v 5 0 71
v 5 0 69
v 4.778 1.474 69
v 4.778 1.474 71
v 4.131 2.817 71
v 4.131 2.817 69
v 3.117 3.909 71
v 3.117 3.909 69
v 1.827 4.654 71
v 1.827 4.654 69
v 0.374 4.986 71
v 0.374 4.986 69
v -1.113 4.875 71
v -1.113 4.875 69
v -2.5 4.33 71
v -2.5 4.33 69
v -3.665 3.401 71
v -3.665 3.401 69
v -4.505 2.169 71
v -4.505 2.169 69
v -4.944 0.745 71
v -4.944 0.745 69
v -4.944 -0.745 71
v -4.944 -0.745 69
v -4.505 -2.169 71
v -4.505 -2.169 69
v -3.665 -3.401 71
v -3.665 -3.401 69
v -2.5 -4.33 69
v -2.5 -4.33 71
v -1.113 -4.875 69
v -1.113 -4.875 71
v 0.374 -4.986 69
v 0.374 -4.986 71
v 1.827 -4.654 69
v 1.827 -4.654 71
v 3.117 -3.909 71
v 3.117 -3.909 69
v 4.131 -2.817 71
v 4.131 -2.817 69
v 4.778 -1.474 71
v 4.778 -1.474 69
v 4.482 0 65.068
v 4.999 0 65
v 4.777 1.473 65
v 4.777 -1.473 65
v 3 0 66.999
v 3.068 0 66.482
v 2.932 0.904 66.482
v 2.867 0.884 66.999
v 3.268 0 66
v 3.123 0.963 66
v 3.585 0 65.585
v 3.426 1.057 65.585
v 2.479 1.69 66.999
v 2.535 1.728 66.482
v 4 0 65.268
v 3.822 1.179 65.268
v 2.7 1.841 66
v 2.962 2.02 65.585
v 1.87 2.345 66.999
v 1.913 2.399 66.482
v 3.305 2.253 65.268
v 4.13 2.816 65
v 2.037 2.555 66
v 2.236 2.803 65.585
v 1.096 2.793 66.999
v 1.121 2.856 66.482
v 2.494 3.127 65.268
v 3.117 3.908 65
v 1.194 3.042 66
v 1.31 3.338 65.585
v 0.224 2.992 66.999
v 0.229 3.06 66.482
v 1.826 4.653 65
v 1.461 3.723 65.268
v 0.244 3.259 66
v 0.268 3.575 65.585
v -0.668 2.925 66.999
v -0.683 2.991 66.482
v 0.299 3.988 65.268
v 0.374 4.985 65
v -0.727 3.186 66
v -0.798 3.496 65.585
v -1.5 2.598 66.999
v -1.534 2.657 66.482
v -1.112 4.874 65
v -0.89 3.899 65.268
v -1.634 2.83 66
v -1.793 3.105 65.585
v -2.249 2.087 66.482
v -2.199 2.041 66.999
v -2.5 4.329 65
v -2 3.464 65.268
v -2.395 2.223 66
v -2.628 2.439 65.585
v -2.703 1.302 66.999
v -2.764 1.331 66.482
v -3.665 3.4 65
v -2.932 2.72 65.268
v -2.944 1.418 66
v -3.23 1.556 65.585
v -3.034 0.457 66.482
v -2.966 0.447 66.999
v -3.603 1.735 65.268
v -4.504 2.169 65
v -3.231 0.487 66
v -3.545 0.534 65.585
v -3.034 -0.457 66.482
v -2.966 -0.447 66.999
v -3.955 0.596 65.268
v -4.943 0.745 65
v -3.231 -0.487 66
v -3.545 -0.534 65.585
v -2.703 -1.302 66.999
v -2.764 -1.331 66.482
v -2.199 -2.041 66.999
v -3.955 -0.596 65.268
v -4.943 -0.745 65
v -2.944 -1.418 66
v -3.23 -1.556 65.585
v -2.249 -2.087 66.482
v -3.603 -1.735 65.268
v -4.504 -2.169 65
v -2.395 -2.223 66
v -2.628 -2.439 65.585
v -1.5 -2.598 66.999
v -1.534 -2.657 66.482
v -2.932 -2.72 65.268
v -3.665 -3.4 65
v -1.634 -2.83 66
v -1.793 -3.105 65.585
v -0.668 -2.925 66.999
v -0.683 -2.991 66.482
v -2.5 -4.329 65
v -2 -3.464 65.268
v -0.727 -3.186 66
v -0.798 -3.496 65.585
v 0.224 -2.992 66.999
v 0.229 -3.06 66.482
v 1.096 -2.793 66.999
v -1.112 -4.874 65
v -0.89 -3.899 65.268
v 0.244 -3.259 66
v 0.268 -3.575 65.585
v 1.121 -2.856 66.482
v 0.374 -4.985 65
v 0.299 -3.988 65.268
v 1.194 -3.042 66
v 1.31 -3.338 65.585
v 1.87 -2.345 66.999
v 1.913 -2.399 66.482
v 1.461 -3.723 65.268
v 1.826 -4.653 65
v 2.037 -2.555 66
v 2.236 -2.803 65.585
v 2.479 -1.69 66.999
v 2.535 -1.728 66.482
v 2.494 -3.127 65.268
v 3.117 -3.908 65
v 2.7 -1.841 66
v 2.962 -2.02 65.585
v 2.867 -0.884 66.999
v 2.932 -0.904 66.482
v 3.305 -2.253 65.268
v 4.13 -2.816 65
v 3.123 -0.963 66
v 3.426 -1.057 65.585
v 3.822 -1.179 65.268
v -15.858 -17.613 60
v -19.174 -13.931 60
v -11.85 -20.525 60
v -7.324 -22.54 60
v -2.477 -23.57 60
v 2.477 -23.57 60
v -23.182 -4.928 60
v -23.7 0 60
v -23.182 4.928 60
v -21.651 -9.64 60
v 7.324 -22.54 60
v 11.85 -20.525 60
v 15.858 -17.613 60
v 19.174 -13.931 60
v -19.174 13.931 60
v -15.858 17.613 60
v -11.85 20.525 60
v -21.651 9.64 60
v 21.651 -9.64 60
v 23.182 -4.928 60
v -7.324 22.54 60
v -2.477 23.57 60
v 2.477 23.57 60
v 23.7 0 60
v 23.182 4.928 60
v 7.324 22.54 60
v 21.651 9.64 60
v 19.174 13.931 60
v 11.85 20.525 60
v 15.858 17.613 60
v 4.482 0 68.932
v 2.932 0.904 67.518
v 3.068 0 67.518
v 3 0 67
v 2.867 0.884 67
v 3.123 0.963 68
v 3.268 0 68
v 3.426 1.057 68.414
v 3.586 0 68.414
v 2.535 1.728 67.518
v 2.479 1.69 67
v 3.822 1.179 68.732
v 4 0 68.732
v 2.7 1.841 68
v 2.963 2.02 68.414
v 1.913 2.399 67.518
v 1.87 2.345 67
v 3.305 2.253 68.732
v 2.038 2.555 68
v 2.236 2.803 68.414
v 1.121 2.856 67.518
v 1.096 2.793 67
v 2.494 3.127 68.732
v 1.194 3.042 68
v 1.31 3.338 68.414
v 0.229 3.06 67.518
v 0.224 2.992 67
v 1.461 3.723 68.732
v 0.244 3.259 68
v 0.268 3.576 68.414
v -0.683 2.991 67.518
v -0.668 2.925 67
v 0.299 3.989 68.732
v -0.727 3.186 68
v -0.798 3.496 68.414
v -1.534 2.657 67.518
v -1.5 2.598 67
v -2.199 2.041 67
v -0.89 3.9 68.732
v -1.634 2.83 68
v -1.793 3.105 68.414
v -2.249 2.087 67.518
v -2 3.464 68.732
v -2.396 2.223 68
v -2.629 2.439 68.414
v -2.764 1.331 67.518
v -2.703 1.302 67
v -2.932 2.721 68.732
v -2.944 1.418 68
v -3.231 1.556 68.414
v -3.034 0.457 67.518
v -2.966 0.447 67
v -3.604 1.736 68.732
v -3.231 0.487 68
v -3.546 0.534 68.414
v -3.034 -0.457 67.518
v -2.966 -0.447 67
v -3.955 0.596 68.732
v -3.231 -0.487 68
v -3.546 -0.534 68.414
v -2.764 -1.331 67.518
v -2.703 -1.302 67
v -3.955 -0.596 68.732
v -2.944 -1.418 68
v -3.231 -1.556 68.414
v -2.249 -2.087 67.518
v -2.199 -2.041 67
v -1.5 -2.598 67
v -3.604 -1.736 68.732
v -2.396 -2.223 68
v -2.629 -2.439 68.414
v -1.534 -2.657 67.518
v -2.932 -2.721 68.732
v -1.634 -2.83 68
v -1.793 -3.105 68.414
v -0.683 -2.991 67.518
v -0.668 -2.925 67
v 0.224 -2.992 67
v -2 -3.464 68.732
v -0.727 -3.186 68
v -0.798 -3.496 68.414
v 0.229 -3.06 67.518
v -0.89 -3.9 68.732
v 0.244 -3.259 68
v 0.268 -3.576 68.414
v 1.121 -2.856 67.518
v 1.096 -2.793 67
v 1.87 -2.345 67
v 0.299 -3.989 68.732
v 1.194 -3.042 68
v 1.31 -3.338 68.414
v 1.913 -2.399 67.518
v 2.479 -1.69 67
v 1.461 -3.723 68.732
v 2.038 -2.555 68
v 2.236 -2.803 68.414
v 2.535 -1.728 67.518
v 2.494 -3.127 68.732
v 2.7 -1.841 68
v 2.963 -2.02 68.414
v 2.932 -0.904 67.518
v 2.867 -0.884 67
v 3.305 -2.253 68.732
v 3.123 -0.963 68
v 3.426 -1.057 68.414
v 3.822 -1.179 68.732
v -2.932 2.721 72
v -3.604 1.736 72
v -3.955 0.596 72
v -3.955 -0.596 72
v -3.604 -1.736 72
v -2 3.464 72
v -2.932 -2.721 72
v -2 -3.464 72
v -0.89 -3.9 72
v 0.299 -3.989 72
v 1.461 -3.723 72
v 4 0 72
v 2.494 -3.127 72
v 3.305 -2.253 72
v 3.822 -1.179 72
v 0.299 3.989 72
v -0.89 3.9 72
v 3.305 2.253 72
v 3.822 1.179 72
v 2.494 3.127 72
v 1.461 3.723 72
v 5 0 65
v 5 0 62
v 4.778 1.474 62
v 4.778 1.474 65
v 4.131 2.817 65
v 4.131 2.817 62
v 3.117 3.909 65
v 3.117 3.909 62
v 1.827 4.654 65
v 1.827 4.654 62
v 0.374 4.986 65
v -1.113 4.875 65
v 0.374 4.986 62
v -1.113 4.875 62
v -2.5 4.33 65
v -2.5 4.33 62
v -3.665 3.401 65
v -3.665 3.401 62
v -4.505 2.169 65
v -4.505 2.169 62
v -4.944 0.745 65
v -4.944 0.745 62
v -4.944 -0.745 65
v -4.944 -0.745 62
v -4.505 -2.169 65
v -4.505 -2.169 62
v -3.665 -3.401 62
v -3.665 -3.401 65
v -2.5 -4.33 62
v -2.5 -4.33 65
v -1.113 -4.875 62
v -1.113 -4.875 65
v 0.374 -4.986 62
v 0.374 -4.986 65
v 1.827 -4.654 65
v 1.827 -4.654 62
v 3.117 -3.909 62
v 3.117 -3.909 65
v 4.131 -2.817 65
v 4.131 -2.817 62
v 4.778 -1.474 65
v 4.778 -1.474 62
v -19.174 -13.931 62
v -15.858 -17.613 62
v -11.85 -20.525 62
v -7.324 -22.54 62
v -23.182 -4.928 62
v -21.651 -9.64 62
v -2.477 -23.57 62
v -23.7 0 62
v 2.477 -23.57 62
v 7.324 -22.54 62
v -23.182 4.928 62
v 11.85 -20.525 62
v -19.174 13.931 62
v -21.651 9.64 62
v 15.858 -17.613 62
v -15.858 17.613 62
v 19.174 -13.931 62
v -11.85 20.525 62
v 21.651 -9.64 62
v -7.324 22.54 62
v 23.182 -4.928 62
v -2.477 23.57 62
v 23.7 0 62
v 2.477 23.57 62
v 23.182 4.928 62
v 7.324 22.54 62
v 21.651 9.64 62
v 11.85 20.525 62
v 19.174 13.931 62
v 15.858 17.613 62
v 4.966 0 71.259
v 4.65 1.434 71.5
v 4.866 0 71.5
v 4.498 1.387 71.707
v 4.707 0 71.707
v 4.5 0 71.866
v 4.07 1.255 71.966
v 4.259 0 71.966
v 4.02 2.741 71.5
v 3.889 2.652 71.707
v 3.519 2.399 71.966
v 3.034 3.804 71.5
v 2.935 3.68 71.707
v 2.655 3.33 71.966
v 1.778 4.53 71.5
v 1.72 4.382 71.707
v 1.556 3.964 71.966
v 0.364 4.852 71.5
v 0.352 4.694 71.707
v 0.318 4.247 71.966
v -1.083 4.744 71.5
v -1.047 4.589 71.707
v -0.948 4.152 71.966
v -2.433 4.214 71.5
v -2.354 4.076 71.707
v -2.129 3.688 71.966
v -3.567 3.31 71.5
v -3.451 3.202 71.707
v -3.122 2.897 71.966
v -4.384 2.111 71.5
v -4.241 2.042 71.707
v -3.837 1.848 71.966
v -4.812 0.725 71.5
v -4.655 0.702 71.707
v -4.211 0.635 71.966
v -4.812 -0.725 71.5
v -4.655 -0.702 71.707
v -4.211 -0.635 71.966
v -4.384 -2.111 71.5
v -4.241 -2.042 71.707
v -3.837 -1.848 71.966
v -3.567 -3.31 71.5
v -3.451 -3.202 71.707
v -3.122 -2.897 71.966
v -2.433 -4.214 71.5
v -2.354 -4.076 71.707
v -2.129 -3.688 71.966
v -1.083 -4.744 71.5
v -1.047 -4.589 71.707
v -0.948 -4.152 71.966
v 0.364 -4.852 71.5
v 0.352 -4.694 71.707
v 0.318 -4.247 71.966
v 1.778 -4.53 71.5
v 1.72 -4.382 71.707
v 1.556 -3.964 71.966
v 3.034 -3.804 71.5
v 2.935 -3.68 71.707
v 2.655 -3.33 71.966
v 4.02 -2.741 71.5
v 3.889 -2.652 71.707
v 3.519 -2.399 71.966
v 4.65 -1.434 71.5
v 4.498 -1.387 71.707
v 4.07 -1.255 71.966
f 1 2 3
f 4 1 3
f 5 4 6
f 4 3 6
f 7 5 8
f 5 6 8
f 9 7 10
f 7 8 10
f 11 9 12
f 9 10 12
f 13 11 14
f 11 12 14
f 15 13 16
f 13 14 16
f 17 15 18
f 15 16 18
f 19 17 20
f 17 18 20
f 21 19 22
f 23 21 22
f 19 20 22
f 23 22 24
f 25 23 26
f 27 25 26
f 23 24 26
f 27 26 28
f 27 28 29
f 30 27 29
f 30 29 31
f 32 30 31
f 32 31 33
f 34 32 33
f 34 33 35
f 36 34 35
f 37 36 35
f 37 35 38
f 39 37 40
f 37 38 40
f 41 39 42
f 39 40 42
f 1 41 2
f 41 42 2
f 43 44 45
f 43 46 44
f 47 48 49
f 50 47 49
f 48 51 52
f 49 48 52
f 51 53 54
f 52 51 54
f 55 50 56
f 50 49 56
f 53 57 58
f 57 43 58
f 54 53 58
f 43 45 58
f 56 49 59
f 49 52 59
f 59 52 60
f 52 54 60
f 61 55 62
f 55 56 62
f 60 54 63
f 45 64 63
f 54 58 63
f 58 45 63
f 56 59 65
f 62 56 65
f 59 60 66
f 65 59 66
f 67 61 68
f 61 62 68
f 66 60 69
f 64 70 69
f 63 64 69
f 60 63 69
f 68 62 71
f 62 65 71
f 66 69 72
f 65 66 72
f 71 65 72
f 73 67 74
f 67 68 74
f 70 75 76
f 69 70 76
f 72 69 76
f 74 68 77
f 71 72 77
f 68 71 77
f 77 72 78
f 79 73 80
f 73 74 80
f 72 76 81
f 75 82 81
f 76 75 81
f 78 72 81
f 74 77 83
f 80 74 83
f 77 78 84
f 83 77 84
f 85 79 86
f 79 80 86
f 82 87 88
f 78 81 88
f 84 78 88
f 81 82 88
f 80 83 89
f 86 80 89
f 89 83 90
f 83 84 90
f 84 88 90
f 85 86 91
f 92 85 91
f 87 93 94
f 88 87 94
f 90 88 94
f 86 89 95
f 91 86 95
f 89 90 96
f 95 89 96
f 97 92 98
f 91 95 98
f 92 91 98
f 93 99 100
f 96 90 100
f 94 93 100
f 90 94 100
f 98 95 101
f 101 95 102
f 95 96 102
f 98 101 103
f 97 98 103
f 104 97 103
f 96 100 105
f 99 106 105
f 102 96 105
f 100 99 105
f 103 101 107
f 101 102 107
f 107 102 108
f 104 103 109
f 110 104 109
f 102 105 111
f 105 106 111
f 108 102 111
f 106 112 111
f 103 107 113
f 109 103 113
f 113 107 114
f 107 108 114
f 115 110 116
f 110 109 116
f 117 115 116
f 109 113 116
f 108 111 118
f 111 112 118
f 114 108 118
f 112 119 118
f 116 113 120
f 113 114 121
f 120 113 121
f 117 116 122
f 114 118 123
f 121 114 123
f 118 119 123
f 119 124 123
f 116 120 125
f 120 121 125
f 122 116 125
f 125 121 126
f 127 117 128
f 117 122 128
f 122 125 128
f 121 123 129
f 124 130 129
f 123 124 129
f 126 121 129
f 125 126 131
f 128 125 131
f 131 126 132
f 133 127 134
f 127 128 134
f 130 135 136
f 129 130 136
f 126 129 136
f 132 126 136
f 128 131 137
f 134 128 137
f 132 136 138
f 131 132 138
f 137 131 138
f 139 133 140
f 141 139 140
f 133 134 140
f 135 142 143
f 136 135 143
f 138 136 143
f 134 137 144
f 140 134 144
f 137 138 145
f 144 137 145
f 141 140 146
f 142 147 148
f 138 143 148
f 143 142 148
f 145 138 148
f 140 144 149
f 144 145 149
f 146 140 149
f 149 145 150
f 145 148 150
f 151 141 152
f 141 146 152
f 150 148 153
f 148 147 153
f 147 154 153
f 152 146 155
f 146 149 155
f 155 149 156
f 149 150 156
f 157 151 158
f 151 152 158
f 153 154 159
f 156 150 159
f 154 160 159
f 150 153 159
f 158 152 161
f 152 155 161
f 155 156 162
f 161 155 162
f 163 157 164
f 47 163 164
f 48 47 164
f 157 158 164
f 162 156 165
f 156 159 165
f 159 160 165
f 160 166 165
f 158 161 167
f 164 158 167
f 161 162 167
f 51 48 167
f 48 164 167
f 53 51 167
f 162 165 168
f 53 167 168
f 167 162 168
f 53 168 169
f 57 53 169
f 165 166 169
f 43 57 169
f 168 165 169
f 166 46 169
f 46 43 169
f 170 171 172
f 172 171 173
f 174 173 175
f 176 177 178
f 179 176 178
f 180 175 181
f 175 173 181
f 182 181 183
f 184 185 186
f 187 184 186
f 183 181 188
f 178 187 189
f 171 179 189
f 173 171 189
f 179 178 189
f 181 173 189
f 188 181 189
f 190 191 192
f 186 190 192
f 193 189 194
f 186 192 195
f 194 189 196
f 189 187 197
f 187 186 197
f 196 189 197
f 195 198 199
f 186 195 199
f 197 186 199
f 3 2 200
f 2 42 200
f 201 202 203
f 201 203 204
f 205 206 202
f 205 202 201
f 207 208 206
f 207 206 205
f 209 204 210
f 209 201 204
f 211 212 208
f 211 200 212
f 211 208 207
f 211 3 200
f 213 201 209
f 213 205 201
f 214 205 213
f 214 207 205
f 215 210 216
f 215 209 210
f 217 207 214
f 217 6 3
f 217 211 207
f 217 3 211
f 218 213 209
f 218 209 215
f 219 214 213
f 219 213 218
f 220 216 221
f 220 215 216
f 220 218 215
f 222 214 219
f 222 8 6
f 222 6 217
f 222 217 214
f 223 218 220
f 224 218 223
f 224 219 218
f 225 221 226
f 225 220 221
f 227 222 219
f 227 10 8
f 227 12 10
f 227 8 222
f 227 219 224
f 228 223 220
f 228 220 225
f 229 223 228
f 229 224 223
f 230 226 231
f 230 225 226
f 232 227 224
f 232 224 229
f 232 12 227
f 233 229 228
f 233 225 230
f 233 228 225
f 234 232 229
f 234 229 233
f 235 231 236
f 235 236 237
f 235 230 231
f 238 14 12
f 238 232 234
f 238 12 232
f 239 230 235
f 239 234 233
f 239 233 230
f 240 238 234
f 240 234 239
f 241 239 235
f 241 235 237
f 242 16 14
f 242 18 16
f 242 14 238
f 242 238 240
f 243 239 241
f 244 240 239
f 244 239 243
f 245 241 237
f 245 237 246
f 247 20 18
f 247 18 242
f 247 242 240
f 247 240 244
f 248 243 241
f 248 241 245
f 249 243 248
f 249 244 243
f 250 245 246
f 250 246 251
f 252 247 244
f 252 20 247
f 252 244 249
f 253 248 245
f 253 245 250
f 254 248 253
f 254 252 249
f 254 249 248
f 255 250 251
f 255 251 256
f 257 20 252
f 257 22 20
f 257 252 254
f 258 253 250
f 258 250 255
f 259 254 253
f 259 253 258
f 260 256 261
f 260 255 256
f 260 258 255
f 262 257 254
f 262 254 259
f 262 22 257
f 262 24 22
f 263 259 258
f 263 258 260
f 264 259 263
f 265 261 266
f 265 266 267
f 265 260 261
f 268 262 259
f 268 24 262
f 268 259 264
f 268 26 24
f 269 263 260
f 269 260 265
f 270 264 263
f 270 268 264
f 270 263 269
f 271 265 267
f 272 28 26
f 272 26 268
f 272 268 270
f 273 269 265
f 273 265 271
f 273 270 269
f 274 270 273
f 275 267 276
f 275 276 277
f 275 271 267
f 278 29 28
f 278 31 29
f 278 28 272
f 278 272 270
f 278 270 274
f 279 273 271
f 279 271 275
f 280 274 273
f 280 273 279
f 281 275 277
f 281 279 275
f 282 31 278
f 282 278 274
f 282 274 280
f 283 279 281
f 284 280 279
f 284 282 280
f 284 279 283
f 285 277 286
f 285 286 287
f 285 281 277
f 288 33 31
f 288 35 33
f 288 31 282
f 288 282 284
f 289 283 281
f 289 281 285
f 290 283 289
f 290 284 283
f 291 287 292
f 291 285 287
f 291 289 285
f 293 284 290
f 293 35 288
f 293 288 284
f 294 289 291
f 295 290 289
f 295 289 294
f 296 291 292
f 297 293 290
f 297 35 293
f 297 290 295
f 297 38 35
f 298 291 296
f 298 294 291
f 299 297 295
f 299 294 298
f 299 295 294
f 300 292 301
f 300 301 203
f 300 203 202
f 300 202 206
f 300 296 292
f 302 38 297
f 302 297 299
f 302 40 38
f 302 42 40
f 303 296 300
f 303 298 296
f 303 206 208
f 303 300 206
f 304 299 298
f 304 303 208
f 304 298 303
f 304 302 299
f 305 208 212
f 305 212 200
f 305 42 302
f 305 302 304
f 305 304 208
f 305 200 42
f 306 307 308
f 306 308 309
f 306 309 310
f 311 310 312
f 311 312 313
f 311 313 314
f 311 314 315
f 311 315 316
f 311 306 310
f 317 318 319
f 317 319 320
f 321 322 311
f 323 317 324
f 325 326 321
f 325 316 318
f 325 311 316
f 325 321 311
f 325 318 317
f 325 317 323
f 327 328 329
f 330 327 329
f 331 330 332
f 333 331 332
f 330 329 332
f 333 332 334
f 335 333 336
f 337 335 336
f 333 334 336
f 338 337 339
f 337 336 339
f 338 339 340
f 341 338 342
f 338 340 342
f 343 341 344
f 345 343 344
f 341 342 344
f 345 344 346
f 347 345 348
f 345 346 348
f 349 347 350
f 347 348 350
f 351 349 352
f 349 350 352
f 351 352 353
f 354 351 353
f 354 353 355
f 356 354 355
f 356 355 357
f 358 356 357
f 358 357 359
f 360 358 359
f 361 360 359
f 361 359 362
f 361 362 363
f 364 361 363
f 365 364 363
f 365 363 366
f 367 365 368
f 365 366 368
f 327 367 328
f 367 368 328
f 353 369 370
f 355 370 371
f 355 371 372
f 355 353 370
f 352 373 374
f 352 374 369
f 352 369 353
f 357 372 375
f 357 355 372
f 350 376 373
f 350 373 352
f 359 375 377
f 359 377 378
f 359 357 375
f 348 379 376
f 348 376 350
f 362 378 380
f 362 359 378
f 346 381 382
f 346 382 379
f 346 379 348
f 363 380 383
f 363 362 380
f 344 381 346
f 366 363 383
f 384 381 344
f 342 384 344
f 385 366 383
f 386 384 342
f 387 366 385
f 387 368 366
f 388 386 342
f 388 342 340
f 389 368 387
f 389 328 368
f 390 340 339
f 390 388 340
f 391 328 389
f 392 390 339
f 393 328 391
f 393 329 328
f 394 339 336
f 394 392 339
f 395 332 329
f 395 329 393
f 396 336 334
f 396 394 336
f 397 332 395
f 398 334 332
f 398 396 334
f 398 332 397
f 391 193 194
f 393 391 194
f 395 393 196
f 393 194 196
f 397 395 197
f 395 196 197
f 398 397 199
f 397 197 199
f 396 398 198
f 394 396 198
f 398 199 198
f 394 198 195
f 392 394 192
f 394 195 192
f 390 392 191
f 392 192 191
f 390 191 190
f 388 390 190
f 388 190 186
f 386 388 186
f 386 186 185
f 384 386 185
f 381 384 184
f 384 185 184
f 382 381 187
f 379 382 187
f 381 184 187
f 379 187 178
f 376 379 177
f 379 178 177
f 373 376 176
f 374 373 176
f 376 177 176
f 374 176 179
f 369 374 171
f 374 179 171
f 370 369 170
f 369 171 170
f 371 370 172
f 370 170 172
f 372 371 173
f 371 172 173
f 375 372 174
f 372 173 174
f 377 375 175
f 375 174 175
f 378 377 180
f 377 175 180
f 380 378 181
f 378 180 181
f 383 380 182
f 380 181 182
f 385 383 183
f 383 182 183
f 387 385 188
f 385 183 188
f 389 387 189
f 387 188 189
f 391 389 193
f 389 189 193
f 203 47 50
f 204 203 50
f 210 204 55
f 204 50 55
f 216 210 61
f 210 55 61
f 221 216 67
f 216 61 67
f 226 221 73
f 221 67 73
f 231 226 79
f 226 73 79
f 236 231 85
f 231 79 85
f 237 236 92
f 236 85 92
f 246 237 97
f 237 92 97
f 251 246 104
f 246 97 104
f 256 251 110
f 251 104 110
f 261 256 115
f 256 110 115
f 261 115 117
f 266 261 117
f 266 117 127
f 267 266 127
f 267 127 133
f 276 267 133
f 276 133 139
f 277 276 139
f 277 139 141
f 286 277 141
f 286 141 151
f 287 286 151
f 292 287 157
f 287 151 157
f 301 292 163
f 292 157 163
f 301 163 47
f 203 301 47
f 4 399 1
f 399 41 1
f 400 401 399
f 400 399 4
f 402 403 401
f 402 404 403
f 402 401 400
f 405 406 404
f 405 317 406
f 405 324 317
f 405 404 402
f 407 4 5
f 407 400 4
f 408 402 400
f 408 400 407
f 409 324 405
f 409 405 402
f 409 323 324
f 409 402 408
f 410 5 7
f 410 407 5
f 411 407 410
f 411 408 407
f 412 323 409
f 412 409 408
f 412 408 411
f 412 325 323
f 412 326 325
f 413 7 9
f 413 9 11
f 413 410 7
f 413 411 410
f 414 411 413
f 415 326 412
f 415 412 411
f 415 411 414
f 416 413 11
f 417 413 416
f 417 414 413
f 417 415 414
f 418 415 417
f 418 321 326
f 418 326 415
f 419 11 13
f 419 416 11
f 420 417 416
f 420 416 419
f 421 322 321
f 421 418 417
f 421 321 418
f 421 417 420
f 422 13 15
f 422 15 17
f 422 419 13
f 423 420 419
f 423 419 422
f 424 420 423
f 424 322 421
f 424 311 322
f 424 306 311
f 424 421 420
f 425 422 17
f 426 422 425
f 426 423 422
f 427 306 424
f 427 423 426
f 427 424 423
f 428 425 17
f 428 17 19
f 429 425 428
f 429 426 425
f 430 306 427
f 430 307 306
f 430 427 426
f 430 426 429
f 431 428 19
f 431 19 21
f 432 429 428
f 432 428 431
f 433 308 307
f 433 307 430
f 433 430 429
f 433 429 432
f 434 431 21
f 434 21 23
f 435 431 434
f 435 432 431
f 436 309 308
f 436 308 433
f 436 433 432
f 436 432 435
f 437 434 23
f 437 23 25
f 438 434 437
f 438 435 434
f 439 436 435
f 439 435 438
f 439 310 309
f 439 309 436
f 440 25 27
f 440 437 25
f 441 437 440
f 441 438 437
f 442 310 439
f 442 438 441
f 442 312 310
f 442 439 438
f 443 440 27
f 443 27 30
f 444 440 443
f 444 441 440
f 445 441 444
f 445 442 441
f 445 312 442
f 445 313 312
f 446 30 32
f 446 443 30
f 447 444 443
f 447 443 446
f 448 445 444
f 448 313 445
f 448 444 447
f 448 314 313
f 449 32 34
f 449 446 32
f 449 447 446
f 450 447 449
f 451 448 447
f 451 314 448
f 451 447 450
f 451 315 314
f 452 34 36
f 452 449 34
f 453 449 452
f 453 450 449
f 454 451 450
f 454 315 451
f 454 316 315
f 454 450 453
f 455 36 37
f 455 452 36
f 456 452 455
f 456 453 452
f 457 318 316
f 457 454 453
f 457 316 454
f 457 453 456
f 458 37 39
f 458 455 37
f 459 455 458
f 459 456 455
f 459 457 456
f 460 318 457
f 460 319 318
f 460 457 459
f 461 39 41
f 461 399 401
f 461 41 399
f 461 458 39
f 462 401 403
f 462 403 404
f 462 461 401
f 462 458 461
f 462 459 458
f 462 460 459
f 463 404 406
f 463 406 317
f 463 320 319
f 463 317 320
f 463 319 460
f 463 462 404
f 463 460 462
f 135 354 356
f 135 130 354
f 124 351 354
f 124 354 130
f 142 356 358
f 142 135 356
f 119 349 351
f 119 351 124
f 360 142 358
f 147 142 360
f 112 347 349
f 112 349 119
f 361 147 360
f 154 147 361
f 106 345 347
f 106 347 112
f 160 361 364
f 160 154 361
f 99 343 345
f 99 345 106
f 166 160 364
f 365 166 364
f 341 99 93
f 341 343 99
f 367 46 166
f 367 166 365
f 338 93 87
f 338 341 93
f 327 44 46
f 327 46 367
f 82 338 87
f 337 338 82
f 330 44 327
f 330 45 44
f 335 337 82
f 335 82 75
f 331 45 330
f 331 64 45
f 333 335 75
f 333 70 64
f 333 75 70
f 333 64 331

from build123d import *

# Parameters (mm, degrees)
SKETCH045_R  = 23.7
PAD019_DEPTH = 2
SKETCH046_R  = 5
PAD020_DEPTH = 3
SKETCH047_R  = 3
PAD021_DEPTH = 4
SKETCH048_R  = 5
PAD022_DEPTH = 3
FILLET_R     = 1.999
FILLET001_R  = 1.9999
FILLET002_R  = 1


with BuildPart() as part:
    # Sketch045 (on Face1 of CopyPocket022) → Pad019 (new body)
    with BuildSketch(Plane.XY.offset(60)):
        Circle(SKETCH045_R)
    extrude(amount=PAD019_DEPTH)

    # Sketch046 (on Face3 of Pad019) → Pad020 (join)
    with BuildSketch(Plane.XY.offset(62)):
        Circle(SKETCH046_R)
    extrude(amount=PAD020_DEPTH)

    # Sketch047 (on Face5 of Pad020) → Pad021 (join)
    with BuildSketch(Plane.XY.offset(65)):
        Circle(SKETCH047_R)
    extrude(amount=PAD021_DEPTH)

    # Sketch048 (on Face7 of Pad021) → Pad022 (join)
    with BuildSketch(Plane.XY.offset(69)):
        Circle(SKETCH048_R)
    extrude(amount=PAD022_DEPTH)

    # Fillet
    fillet_edges = [part.edges().sort_by_distance(p)[0] for p in [
        (-3, 0, 65),
    ]]
    fillet(fillet_edges, radius=FILLET_R)

    # Fillet001
    fillet001_edges = [part.edges().sort_by_distance(p)[0] for p in [
        (-3, 0, 69),
    ]]
    fillet(fillet001_edges, radius=FILLET001_R)

    # Fillet002
    fillet002_edges = [part.edges().sort_by_distance(p)[0] for p in [
        (-5, 0, 72),
    ]]
    fillet(fillet002_edges, radius=FILLET002_R)


solid = part.part
